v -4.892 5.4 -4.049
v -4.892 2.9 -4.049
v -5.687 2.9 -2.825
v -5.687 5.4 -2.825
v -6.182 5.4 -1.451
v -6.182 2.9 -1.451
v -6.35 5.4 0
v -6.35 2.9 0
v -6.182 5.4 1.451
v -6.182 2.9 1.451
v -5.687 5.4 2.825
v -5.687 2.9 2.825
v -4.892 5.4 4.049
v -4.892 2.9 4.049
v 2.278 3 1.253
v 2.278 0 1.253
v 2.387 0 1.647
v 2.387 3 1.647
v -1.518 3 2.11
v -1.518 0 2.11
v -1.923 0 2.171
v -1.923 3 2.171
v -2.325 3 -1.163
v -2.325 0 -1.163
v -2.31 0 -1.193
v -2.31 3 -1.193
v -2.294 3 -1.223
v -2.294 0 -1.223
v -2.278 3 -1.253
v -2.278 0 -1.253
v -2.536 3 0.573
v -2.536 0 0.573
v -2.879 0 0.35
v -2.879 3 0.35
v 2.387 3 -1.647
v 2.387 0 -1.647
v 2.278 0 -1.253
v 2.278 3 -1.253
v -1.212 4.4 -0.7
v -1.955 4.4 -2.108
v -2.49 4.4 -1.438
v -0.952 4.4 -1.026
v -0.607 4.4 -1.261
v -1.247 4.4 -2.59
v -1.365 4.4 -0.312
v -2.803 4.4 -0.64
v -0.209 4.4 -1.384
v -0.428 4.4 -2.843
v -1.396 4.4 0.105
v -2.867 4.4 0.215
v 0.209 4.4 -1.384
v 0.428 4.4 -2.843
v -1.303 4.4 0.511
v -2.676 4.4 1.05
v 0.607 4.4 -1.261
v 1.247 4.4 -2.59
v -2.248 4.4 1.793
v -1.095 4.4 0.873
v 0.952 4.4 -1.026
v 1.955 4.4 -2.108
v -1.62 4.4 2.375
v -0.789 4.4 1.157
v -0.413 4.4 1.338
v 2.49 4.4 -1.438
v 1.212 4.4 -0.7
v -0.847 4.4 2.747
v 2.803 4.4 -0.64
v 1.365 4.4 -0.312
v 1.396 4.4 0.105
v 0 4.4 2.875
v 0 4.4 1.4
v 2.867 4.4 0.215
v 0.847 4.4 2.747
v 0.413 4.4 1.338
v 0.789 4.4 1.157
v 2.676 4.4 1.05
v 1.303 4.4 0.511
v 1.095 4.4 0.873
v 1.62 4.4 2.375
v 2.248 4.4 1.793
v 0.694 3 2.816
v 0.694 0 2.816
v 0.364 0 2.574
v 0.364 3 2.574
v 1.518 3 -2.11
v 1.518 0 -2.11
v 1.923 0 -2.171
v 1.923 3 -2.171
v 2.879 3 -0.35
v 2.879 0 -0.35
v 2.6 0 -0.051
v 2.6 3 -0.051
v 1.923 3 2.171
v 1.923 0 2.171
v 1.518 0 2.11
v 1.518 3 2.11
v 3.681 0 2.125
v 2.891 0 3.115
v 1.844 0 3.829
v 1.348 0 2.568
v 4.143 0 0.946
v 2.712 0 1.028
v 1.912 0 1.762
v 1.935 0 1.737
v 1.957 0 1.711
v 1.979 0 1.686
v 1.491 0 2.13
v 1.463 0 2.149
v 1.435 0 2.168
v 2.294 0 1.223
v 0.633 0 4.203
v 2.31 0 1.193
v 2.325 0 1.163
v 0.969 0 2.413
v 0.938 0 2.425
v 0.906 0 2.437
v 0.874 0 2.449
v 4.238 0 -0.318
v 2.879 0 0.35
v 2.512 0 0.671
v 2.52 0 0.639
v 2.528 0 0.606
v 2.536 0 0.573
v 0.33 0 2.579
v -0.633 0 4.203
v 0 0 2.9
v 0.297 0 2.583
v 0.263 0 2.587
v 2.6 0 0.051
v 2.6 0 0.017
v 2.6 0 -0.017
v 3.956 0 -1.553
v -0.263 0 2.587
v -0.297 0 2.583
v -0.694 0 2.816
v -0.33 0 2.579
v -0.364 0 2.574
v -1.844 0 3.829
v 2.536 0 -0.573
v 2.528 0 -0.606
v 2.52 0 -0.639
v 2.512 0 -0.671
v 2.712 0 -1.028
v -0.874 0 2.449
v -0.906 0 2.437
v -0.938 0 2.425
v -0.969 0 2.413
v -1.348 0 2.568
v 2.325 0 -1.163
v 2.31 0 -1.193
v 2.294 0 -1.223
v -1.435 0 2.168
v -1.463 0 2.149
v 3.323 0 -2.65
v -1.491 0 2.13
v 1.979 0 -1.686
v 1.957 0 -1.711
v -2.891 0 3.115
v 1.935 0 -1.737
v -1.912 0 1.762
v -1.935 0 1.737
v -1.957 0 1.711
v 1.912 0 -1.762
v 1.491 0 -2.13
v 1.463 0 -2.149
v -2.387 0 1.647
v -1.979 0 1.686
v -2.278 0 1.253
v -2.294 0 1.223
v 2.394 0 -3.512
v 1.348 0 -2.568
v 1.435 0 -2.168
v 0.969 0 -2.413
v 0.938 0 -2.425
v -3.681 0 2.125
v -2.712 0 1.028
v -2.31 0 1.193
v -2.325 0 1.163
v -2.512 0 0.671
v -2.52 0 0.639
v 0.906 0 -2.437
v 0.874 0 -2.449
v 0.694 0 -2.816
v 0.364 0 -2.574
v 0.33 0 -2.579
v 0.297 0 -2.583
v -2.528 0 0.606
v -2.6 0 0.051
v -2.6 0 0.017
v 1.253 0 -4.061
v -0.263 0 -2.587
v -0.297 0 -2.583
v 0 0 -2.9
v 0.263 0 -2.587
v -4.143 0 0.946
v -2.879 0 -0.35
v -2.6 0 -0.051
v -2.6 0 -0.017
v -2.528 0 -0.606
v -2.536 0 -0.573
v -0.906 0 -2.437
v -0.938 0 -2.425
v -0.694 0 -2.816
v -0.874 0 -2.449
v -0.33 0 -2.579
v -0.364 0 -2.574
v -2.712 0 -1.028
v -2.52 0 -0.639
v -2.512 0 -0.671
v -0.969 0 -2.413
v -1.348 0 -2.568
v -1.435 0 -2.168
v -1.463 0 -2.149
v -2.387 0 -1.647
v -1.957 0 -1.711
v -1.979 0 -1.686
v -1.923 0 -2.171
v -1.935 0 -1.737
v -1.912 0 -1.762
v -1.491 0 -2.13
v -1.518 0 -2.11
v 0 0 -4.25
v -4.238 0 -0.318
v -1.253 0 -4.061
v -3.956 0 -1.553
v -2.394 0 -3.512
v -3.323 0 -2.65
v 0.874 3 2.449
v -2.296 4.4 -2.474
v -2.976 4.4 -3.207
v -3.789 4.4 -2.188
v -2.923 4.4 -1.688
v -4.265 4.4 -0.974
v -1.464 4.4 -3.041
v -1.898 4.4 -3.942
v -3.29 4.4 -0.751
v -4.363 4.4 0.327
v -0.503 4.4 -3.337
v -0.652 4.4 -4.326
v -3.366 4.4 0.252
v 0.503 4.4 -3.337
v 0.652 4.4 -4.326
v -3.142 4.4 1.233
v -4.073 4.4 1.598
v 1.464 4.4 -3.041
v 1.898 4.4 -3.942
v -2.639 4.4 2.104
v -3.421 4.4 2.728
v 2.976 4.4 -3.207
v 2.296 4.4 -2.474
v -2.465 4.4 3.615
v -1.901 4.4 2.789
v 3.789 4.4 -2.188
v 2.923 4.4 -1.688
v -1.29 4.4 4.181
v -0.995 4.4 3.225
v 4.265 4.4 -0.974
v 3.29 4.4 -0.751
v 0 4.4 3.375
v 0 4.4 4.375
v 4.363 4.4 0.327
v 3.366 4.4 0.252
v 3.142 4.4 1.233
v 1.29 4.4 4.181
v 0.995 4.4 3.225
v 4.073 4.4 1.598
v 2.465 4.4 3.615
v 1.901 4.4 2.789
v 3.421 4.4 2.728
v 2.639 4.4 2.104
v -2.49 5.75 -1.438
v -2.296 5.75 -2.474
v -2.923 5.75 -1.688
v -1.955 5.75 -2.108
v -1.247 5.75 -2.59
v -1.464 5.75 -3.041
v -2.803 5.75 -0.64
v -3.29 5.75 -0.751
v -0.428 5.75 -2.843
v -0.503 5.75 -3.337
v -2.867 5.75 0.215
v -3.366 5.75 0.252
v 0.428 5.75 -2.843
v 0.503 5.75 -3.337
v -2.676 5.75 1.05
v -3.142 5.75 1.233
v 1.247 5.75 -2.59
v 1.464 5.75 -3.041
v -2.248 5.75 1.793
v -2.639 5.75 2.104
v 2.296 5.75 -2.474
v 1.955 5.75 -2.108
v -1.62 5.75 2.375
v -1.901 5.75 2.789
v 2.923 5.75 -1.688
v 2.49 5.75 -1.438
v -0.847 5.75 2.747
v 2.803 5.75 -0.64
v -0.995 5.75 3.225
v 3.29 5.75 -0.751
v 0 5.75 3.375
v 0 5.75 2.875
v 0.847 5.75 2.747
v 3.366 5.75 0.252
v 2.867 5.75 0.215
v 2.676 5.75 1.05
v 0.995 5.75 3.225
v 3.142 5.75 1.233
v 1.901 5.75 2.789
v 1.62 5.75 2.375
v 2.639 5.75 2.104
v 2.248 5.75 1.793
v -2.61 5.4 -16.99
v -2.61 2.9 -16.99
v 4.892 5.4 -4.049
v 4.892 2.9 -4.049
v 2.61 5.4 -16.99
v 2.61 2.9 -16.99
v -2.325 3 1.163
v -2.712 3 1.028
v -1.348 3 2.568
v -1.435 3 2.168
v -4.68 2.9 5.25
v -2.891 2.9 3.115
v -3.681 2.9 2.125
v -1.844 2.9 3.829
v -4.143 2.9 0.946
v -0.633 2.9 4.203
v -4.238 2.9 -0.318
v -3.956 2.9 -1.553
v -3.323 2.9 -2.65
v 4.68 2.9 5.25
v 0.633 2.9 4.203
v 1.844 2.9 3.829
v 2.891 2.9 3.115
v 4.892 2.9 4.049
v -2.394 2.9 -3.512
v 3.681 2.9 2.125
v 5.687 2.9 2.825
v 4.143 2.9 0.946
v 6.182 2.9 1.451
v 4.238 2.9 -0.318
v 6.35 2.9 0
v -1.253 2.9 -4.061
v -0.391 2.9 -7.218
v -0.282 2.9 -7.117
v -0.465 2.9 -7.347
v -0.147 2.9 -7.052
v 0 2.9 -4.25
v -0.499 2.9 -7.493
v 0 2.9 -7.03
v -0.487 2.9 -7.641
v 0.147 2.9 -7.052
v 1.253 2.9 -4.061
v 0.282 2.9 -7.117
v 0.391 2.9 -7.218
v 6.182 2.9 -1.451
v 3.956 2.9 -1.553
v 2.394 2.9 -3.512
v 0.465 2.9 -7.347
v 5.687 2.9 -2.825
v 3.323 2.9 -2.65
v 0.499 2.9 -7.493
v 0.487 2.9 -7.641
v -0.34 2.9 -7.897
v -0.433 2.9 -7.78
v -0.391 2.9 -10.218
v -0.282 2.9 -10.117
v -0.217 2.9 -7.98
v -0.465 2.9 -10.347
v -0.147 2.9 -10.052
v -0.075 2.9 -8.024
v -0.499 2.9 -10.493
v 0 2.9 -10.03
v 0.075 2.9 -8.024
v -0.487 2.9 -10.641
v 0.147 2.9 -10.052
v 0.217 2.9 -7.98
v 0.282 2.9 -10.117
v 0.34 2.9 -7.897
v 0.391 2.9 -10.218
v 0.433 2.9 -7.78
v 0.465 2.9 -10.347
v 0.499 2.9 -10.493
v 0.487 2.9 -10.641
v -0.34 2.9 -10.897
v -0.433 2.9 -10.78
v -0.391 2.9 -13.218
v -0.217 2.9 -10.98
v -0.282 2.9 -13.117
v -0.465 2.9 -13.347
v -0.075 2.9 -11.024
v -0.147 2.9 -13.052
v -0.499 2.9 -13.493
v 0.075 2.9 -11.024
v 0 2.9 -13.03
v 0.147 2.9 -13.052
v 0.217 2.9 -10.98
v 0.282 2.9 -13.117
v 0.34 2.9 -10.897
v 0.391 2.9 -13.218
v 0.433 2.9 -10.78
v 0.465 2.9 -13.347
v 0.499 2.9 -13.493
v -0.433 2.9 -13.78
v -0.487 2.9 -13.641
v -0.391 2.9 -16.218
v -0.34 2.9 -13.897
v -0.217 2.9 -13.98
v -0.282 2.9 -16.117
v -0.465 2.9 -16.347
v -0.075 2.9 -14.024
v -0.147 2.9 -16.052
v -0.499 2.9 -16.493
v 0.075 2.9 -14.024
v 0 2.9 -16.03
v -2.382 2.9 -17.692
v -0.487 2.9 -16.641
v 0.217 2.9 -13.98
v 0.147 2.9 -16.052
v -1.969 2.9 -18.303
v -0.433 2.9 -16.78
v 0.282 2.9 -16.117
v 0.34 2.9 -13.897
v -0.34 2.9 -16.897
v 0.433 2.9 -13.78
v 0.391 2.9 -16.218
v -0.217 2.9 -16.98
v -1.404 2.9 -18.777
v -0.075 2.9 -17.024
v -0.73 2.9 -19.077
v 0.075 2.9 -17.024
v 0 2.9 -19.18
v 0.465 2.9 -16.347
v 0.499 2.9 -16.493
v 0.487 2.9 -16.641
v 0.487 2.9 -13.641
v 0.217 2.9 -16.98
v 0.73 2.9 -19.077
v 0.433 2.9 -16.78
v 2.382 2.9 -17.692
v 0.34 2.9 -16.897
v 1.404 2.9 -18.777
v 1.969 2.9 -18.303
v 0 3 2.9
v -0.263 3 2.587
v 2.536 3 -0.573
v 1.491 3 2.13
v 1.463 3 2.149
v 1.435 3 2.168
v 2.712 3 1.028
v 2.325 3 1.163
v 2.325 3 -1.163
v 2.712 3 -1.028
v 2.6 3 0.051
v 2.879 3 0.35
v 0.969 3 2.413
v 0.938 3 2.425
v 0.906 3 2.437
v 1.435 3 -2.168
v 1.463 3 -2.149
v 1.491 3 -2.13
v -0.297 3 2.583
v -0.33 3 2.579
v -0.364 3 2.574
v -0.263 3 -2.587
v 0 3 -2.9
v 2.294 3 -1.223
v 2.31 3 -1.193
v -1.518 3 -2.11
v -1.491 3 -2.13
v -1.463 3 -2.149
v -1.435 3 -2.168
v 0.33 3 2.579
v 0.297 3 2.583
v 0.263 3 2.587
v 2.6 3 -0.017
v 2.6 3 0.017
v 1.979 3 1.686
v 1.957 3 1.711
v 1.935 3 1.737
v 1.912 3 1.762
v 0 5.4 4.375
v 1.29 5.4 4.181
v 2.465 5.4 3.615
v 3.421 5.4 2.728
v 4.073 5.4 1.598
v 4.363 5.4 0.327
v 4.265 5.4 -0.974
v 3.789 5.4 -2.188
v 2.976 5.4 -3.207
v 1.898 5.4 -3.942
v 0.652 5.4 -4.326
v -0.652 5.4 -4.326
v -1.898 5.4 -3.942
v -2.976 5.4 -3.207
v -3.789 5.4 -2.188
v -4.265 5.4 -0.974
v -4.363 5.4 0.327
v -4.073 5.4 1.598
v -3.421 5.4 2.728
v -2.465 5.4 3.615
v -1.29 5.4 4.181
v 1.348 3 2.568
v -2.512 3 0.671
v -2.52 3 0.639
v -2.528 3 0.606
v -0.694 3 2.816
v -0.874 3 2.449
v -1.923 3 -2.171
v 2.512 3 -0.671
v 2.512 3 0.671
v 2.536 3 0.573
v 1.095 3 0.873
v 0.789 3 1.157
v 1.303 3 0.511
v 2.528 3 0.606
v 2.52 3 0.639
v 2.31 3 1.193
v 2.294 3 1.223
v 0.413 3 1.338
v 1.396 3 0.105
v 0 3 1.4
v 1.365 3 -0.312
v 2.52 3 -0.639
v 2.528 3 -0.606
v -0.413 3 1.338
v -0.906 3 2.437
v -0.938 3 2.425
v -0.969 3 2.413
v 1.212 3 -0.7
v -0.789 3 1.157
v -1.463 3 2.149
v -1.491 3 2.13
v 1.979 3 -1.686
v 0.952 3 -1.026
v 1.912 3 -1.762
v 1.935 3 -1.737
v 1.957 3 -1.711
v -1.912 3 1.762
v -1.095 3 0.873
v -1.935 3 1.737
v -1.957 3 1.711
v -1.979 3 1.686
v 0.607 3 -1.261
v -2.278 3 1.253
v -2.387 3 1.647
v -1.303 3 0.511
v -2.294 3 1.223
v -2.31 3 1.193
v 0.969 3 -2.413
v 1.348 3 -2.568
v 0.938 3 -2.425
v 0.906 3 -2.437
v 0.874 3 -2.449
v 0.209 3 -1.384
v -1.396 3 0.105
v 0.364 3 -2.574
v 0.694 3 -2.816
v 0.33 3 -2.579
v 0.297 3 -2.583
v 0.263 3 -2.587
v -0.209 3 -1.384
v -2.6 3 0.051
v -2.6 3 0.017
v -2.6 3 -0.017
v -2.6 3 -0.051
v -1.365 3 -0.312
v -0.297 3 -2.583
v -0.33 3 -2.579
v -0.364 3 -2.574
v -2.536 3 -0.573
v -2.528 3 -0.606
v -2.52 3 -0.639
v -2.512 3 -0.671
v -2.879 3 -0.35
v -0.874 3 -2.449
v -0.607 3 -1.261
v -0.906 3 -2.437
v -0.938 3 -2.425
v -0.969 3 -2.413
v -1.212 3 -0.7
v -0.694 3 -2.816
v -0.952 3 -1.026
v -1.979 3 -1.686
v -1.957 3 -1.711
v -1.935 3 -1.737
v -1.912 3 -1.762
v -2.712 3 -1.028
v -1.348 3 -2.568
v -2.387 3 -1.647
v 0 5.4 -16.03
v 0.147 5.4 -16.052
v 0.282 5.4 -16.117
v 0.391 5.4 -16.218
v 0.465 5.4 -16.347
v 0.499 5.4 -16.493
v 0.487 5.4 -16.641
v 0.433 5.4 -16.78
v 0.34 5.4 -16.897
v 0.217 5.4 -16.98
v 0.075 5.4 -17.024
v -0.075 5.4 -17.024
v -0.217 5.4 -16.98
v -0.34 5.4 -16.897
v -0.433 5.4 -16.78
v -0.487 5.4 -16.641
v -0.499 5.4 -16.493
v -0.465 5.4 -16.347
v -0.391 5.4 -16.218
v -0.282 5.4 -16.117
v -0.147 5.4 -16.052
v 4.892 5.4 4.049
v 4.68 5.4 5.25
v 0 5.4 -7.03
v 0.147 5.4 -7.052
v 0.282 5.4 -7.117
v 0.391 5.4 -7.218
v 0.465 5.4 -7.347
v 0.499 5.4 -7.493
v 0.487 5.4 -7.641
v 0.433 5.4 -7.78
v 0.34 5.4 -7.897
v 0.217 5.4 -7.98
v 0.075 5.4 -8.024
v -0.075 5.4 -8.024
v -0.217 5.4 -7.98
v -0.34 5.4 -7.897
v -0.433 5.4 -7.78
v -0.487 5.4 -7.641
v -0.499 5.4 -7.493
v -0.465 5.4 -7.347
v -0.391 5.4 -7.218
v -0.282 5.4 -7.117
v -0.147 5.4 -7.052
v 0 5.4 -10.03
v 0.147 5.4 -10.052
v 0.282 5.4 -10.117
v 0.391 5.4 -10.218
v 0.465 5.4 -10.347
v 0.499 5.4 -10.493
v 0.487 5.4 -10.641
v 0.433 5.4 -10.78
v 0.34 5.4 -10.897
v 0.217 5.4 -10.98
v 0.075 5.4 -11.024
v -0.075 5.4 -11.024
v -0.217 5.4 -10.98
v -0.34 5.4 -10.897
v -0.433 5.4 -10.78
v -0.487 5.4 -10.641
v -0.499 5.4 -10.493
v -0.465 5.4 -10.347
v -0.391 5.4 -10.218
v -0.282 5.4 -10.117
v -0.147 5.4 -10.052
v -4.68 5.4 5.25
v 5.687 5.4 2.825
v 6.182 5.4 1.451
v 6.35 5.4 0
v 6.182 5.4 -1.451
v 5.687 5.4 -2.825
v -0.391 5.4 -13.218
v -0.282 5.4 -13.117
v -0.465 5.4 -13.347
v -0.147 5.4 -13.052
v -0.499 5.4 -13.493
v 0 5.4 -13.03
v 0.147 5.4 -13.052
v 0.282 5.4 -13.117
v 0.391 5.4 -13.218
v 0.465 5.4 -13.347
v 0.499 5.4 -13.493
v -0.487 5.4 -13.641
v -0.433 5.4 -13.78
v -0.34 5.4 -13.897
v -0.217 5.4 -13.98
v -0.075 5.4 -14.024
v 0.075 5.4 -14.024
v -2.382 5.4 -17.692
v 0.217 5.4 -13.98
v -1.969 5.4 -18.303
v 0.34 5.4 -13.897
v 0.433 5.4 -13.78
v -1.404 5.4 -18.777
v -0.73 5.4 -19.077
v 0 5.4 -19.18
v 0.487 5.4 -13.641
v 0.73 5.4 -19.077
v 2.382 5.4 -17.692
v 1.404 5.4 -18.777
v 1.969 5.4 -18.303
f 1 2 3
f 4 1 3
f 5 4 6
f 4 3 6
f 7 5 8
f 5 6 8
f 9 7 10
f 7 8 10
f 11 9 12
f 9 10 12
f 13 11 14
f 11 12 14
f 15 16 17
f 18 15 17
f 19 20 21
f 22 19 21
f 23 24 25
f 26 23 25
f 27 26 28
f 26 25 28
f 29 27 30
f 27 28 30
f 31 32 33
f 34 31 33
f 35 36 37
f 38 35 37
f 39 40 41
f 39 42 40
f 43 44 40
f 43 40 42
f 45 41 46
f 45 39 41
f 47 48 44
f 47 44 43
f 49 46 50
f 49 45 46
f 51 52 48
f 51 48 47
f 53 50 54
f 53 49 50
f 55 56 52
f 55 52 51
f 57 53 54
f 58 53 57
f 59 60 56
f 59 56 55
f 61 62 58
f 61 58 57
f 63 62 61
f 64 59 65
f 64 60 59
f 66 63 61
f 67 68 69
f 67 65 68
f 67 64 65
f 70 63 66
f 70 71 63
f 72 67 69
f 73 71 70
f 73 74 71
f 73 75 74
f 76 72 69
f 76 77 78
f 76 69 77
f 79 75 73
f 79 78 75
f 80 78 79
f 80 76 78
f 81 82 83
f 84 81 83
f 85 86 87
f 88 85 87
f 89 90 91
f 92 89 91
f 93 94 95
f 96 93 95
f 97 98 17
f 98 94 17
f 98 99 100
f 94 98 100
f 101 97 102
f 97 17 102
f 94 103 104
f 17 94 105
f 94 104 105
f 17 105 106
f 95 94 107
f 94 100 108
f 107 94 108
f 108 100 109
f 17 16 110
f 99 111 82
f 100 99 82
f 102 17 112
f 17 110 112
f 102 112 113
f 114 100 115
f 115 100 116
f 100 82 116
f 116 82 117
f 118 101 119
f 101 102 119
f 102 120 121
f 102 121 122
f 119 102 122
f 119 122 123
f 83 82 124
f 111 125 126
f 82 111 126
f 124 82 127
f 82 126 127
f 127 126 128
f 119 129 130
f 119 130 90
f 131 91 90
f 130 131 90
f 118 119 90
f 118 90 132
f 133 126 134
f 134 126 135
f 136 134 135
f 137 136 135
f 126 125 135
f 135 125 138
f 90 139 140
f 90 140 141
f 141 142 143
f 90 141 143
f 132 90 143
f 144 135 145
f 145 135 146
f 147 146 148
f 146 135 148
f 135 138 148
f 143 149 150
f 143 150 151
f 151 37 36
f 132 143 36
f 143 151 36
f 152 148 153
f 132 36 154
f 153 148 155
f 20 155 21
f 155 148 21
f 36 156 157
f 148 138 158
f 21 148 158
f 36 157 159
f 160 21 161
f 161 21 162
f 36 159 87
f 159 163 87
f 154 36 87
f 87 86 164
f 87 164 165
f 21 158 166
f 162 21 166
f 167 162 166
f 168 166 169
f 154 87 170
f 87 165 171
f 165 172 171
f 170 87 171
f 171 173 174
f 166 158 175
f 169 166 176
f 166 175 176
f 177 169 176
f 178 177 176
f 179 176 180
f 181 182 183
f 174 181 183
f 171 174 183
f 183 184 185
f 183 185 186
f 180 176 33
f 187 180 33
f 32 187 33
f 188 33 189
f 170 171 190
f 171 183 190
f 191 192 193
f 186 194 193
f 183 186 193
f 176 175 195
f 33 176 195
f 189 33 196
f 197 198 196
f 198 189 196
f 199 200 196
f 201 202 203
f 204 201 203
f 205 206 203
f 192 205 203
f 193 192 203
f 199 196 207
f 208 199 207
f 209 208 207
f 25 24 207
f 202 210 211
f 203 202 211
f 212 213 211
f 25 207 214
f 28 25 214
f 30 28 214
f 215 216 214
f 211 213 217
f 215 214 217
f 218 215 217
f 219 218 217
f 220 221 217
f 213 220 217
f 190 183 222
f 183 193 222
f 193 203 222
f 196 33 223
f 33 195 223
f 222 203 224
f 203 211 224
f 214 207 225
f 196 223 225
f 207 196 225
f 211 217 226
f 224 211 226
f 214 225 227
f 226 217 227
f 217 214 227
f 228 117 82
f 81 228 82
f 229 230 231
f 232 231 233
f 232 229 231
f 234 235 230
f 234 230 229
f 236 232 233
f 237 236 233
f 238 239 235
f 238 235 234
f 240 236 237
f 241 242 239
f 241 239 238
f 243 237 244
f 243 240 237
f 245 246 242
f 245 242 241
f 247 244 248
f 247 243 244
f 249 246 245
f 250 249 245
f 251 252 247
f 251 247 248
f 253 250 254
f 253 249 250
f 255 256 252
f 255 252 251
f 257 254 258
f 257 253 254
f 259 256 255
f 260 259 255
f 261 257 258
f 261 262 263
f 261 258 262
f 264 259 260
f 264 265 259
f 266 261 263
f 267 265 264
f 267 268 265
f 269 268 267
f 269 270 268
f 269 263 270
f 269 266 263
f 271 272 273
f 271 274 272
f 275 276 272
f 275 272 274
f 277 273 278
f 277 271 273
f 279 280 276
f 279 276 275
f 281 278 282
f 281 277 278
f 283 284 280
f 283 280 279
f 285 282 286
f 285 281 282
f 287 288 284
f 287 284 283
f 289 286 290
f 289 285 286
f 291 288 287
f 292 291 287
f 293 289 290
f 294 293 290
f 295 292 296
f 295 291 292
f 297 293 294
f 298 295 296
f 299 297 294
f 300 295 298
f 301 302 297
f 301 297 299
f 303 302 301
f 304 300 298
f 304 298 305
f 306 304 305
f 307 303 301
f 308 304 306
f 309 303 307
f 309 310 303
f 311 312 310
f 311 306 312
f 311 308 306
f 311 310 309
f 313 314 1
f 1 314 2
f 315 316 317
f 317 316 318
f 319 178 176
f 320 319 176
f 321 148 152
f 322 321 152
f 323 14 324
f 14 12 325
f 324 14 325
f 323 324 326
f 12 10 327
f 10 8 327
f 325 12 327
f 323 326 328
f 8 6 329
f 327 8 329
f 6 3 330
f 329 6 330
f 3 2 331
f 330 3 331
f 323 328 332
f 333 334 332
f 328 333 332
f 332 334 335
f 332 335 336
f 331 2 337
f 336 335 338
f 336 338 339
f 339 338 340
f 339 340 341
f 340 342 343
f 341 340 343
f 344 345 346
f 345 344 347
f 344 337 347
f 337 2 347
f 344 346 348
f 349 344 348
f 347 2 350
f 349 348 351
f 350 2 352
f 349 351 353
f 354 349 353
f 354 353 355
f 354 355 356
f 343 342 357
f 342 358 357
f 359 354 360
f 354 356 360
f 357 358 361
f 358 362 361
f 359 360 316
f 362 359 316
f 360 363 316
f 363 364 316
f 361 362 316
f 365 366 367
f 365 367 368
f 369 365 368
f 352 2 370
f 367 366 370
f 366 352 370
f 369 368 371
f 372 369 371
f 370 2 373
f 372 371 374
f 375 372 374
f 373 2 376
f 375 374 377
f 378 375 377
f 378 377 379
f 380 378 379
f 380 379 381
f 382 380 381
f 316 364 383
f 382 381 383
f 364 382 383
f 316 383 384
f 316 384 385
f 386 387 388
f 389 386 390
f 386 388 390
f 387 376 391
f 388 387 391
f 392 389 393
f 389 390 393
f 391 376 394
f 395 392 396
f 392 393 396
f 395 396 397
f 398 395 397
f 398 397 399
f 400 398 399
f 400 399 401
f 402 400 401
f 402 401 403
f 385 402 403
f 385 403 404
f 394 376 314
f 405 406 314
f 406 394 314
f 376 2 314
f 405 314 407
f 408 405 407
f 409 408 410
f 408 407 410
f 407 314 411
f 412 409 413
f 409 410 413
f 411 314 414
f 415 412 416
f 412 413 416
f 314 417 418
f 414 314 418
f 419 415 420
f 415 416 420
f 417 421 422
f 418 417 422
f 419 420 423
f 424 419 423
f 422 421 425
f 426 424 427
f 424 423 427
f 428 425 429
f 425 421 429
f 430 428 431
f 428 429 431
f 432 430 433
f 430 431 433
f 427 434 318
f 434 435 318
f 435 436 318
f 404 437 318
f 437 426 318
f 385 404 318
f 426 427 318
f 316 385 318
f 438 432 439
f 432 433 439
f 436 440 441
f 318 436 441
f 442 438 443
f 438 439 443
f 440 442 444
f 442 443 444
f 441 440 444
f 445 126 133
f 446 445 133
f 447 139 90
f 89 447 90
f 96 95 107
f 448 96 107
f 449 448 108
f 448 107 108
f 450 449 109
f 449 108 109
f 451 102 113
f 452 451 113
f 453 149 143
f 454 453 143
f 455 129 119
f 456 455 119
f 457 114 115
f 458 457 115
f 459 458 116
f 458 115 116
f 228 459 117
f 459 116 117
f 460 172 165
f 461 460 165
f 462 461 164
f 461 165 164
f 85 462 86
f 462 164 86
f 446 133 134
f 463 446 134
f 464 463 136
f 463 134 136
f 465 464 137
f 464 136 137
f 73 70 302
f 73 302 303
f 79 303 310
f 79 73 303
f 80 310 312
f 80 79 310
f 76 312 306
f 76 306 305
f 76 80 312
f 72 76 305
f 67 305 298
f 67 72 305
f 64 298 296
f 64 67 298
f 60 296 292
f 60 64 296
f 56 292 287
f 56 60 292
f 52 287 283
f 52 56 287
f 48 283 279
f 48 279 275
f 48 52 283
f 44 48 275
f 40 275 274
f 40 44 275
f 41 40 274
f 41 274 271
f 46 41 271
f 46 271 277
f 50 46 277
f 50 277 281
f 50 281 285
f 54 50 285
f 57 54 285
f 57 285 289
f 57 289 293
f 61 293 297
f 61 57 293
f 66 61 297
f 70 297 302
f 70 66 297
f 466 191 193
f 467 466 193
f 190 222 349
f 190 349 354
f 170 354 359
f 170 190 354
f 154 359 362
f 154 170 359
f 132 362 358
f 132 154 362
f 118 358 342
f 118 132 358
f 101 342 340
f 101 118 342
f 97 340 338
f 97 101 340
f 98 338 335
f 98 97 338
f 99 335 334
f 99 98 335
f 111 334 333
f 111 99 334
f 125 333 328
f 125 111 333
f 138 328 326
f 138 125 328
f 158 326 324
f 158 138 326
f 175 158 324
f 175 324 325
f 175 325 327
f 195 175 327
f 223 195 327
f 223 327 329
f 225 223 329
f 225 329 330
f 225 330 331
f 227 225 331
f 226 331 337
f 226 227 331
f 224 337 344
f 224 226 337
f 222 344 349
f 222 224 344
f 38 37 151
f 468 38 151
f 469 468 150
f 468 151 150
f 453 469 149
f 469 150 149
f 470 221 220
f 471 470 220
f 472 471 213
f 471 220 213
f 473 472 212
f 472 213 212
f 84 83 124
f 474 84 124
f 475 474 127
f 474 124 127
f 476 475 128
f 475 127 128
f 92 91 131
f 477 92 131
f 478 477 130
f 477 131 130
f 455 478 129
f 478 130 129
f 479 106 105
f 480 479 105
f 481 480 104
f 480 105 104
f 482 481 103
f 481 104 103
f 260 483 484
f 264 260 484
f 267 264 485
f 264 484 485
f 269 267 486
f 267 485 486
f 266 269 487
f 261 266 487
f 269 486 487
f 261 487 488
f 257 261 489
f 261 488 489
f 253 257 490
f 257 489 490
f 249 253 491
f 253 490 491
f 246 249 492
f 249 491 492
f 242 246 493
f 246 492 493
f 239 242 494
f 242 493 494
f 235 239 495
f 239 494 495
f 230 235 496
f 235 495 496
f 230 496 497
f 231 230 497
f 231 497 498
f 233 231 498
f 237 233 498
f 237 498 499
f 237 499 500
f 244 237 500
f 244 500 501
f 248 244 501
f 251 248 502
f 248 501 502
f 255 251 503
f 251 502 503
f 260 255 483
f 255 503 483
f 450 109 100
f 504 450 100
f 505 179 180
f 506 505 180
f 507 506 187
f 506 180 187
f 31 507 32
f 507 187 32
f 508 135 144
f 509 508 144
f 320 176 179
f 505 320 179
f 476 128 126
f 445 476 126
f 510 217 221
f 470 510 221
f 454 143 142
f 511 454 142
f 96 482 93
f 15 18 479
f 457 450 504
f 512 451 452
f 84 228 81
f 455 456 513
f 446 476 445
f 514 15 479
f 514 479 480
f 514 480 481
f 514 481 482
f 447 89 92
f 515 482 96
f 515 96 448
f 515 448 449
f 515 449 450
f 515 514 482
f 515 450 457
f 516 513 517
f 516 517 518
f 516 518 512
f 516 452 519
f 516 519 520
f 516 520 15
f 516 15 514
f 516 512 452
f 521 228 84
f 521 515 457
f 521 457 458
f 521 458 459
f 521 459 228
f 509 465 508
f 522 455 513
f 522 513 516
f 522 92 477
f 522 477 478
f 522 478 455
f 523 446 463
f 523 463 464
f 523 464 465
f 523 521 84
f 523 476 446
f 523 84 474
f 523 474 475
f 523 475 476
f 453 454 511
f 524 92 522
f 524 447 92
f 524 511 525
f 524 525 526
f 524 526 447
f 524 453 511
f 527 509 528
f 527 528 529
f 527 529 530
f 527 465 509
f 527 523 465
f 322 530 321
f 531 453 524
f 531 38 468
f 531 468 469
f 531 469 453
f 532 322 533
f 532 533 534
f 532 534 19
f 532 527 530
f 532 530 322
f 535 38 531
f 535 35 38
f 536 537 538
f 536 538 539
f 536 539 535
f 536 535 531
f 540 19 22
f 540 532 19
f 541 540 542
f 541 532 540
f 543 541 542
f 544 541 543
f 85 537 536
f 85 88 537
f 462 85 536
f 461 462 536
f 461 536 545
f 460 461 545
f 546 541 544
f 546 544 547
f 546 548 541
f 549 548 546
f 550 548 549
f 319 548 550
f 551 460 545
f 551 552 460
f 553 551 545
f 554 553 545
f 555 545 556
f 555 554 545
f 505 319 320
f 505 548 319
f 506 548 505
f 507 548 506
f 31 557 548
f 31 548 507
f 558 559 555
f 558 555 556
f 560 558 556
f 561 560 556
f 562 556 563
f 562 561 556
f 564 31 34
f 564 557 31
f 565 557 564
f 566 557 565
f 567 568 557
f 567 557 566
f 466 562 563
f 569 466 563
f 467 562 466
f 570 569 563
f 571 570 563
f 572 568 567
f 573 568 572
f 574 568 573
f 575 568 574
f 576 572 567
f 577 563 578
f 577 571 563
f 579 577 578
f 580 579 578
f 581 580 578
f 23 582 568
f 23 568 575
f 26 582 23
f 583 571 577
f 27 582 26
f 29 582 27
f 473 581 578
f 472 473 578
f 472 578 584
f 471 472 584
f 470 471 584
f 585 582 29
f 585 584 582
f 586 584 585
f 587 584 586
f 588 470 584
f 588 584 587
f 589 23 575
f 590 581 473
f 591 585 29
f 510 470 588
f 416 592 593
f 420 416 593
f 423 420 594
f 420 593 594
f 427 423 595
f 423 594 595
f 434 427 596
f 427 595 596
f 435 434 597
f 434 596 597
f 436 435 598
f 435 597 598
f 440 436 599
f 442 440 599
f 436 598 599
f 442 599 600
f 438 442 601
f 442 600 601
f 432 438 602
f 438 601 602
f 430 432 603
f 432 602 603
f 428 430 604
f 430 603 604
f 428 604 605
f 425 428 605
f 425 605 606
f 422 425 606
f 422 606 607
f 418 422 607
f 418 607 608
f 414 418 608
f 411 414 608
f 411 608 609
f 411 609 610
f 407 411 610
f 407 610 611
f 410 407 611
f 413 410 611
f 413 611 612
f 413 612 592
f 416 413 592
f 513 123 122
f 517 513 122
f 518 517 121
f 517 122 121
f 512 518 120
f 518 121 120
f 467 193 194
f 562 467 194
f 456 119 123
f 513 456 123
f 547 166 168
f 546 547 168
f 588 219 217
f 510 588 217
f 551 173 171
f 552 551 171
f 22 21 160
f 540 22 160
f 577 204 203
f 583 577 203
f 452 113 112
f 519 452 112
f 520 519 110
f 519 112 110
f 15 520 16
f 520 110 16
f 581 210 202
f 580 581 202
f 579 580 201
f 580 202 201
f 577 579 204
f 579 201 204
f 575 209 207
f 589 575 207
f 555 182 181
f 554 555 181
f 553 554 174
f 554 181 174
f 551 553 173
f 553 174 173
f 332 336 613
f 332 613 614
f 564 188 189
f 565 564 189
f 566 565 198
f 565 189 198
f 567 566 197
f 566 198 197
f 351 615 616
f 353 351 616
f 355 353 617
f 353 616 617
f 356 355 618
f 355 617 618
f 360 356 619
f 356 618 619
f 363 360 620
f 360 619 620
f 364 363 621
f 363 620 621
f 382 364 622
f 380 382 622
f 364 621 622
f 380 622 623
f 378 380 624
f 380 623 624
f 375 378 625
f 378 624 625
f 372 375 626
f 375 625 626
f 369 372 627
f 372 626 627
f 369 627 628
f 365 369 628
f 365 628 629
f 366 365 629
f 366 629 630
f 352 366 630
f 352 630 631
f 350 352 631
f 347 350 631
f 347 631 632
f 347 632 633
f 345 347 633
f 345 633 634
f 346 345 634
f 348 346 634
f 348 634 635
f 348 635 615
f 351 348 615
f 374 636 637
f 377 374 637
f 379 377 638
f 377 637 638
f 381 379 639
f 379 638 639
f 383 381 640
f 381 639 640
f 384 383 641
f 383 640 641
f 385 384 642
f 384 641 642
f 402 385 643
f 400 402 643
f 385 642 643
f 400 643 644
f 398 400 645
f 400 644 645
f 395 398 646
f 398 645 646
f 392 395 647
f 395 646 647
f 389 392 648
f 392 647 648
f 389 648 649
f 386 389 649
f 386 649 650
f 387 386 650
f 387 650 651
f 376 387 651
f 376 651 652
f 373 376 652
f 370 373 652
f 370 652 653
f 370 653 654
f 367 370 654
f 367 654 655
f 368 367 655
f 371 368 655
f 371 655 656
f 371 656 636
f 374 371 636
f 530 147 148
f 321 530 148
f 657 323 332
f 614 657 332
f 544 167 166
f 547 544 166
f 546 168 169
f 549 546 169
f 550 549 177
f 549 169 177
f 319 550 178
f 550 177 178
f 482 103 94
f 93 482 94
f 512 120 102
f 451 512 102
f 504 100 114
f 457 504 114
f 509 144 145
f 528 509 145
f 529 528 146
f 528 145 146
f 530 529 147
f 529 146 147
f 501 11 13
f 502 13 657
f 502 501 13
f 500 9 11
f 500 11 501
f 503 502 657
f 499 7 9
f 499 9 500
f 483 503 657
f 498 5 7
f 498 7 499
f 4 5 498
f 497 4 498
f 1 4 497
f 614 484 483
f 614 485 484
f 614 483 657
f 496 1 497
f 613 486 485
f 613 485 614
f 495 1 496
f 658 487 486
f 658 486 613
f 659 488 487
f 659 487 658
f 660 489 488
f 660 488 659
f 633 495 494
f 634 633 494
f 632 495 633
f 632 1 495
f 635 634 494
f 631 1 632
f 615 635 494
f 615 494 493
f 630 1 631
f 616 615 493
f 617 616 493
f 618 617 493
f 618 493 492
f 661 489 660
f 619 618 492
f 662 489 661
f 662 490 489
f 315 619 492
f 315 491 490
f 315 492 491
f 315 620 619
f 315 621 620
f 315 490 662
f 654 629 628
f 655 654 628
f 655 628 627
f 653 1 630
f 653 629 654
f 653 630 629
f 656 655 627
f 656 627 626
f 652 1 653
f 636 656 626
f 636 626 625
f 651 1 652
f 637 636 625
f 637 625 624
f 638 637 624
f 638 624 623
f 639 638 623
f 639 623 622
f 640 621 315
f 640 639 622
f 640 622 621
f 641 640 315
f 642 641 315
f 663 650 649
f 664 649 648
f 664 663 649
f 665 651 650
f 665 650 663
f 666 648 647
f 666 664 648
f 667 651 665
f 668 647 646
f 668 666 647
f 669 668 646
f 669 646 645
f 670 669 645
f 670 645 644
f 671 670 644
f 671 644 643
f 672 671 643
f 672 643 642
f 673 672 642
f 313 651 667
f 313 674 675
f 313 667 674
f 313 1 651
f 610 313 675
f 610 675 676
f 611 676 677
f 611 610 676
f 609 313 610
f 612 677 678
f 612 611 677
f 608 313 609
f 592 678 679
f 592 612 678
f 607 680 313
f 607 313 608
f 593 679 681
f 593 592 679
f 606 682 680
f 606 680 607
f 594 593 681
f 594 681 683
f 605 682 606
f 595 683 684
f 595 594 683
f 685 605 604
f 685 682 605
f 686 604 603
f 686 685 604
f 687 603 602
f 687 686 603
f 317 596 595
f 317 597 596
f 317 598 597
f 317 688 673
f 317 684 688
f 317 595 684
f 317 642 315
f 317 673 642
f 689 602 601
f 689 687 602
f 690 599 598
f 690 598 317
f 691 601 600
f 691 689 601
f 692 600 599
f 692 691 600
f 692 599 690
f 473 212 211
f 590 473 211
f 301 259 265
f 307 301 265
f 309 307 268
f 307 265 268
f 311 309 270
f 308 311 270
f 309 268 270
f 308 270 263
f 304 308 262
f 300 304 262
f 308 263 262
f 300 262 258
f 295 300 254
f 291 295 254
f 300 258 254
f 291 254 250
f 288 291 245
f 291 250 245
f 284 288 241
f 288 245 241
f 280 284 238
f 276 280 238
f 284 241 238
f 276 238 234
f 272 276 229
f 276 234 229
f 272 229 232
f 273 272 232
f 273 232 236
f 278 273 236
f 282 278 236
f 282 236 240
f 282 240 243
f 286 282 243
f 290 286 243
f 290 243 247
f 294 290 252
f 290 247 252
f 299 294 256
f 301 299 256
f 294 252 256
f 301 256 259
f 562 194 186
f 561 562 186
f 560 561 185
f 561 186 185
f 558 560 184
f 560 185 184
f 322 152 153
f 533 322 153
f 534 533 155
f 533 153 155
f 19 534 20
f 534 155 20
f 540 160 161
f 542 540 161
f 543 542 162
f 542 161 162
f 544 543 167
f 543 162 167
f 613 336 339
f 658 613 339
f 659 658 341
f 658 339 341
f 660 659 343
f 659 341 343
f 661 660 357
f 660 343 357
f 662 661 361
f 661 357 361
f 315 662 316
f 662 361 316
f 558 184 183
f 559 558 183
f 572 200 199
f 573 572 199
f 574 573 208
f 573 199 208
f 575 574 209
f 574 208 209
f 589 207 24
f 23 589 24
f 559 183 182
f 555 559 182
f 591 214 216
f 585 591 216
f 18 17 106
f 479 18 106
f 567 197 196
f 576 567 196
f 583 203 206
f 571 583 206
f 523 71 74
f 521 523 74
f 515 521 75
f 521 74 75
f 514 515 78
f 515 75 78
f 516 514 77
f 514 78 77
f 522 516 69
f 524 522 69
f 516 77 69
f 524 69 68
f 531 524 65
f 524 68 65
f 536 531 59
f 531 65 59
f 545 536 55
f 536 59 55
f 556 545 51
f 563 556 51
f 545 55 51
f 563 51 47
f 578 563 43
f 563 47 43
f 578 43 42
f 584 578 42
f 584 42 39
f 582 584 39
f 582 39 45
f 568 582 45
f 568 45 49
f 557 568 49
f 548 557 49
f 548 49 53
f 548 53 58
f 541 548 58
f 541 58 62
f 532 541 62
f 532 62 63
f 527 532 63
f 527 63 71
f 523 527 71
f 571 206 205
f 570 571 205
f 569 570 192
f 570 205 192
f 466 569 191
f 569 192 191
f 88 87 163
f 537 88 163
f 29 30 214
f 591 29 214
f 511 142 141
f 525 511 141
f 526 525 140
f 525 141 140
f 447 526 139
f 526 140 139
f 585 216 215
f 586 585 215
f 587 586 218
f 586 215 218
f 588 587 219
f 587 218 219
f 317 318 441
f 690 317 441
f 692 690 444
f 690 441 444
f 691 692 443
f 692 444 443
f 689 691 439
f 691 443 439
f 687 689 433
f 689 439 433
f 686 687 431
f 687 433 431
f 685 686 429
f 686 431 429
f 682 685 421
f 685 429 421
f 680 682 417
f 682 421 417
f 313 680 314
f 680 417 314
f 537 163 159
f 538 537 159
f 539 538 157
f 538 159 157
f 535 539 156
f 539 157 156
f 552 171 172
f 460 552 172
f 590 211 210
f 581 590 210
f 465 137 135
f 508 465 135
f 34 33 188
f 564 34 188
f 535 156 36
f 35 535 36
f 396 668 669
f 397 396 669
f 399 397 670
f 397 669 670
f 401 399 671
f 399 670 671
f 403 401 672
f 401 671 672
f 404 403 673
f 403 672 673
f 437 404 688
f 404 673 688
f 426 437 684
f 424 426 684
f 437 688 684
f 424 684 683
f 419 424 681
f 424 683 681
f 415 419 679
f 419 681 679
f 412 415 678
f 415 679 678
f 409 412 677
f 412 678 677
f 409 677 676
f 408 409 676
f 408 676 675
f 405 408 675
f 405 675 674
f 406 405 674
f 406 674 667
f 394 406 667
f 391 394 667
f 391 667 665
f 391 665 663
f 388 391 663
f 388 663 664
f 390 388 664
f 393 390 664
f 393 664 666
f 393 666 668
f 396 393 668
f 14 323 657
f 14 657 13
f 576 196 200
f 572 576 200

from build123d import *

# Parameters (mm, degrees)
BASES_R                     = 6.35
BASE_DEPTH                  = 5.4
TOPBORES_R                  = 1.4
TOP_BORE_DEPTH              = 11.478788098
HORN_START                  = -2.5
HORN_HALF_DEPTH             = 2.5
HORNATTACHS_R               = 0.5
HORN_ATTACH_DEPTH           = 21.913031822
HA_LP_COUNT                 = 4
HA_LP_PITCH                 = 3
HORN_BODIES_COPY_1_SKETCH_R = 0.5
HORN_BODIES_COPY_1_DEPTH    = 21.913031822
HORN_BODIES_COPY_2_SKETCH_R = 0.5
HORN_BODIES_COPY_2_DEPTH    = 21.913031822
HORN_BODIES_COPY_3_SKETCH_R = 0.5
HORN_BODIES_COPY_3_DEPTH    = 21.913031822
TOOTH_DEPTH                 = 3
TOOTH_CP_COUNT              = 26
BOTTOMBORES_R               = 2.6
BOTTOM_BORE_DEPTH           = 3
HOLDINGSHAFTS_R             = 6.35
HOLDINGSHAFTS_R_2           = 4.25
HOLDING_SHAFT_DEPTH         = 2.9
TOPCUTS_R                   = 4.375
TOP_CUT_DEPTH               = 1
TOPPOCKETCYLINDERS_R        = 3.375
TOPPOCKETCYLINDERS_R_2      = 2.875
TOP_POCKET_CYLINDER_DEPTH   = 1.35
CUT_EXTRUDE1_START          = -2.5
CUT_EXTRUDE1_DEPTH          = 2.5


with BuildPart() as part:
    # BaseS → BASE (new body)
    with BuildSketch(Plane(origin=(0, 0, 0), x_dir=(1, 0, 0), z_dir=(0, 1, 0))):
        with Locations(Location((0, 0, 0), (0, 0, 90))):
            Circle(BASES_R)
    extrude(amount=BASE_DEPTH)

    # TopBoreS → TOP BORE (cut, through all)
    with BuildSketch(Plane(origin=(0, 5.4, 0), x_dir=(1, 0, 0), z_dir=(0, 1, 0))):
        with Locations(Location((0, 0, 0), (0, 0, 270))):
            Circle(TOPBORES_R)
    extrude(amount=-TOP_BORE_DEPTH, mode=Mode.SUBTRACT)

    # HornHalfS → HORN HALF (add)
    with BuildSketch(Plane(origin=(0, 5.4, 0), x_dir=(1, 0, 0), z_dir=(0, 1, 0)).offset(HORN_START)):
        with BuildLine():
            Line((-2.609740545, 16.990167671), (-4.891612682, 4.049027706))
            ThreePointArc((-4.891612682, 4.049027706), (0, 6.35), (4.891612682, 4.049027706))
            Line((4.891612682, 4.049027706), (2.609740545, 16.990167671))
            ThreePointArc((2.609740545, 16.990167671), (0, 19.18), (-2.609740545, 16.990167671))
        make_face()
    horn_half = extrude(amount=HORN_HALF_DEPTH)

    # HornAttachS → HORN ATTACH (cut, through all)
    with BuildSketch(Plane(origin=(0, 5.4, 0), x_dir=(1, 0, 0), z_dir=(0, 1, 0))):
        with Locations(Location((0, 16.53, 0), (0, 0, 270))):
            Circle(HORNATTACHS_R)
    horn_attach = extrude(amount=-HORN_ATTACH_DEPTH, mode=Mode.SUBTRACT)

    # HA LP: HORN ATTACH ×4
    with Locations(*[(0, 0, i * HA_LP_PITCH) for i in range(1, HA_LP_COUNT)]):
        add(horn_attach, mode=Mode.SUBTRACT)

    # HORN BODIES: HORN HALF, HORN ATTACH across plane
    add(horn_half.mirror(Plane.XY))
    add(horn_attach.mirror(Plane.XY), mode=Mode.SUBTRACT)

    # HORN BODIES copy 1 sketch → HORN BODIES copy 1 (cut, through all)
    with BuildSketch(Plane(origin=(0, 5.4, -3), x_dir=(1, 0, 0), z_dir=(0, 1, 0))):
        with Locations((0, -16.53)):
            Circle(HORN_BODIES_COPY_1_SKETCH_R)
    extrude(amount=-HORN_BODIES_COPY_1_DEPTH, mode=Mode.SUBTRACT)

    # HORN BODIES copy 2 sketch → HORN BODIES copy 2 (cut, through all)
    with BuildSketch(Plane(origin=(0, 5.4, -6), x_dir=(1, 0, 0), z_dir=(0, 1, 0))):
        with Locations((0, -16.53)):
            Circle(HORN_BODIES_COPY_2_SKETCH_R)
    extrude(amount=-HORN_BODIES_COPY_2_DEPTH, mode=Mode.SUBTRACT)

    # HORN BODIES copy 3 sketch → HORN BODIES copy 3 (cut, through all)
    with BuildSketch(Plane(origin=(0, 5.4, -9), x_dir=(1, 0, 0), z_dir=(0, 1, 0))):
        with Locations((0, -16.53)):
            Circle(HORN_BODIES_COPY_3_SKETCH_R)
    extrude(amount=-HORN_BODIES_COPY_3_DEPTH, mode=Mode.SUBTRACT)

    # ToothS → TOOTH (cut)
    with BuildSketch(Plane.XZ):
        with BuildLine():
            Line((0, -2.9), (0.262912611, -2.586672952))
            ThreePointArc((0.262912611, -2.586672952), (0, -2.6), (-0.262912611, -2.586672952))
            Line((-0.262912611, -2.586672952), (0, -2.9))
        make_face()
    tooth = extrude(amount=-TOOTH_DEPTH, mode=Mode.SUBTRACT)

    # TOOTH CP: TOOTH ×26 about axis
    tooth_cp_axis = Axis((0, 0, 0), (0, 1, 0))
    for i in range(1, TOOTH_CP_COUNT):
        add(tooth.rotate(tooth_cp_axis, i * 360 / TOOTH_CP_COUNT), mode=Mode.SUBTRACT)

    # BottomBoreS → BOTTOM BORE (cut)
    with BuildSketch(Plane(origin=(0, 0, 0), x_dir=(-1, 0, 0), z_dir=(0, -1, 0))):
        Circle(BOTTOMBORES_R)
    extrude(amount=-BOTTOM_BORE_DEPTH, mode=Mode.SUBTRACT)

    # HoldingShaftS → HOLDING SHAFT (cut)
    with BuildSketch(Plane.XZ):
        Circle(HOLDINGSHAFTS_R)
        with Locations(Location((0, 0, 0), (0, 0, 270))):
            Circle(HOLDINGSHAFTS_R_2, mode=Mode.SUBTRACT)
    extrude(amount=-HOLDING_SHAFT_DEPTH, mode=Mode.SUBTRACT)

    # TopCutS → TOP CUT (cut)
    with BuildSketch(Plane(origin=(0, 5.4, 0), x_dir=(1, 0, 0), z_dir=(0, 1, 0))):
        with Locations(Location((0, 0, 0), (0, 0, 270))):
            Circle(TOPCUTS_R)
    extrude(amount=-TOP_CUT_DEPTH, mode=Mode.SUBTRACT)

    # TopPocketCylinderS → TOP POCKET CYLINDER (add)
    with BuildSketch(Plane(origin=(0, 4.4, 0), x_dir=(1, 0, 0), z_dir=(0, 1, 0))):
        with Locations(Location((0, 0, 0), (0, 0, 270))):
            Circle(TOPPOCKETCYLINDERS_R)
        with Locations(Location((0, 0, 0), (0, 0, 270))):
            Circle(TOPPOCKETCYLINDERS_R_2, mode=Mode.SUBTRACT)
    extrude(amount=TOP_POCKET_CYLINDER_DEPTH)

    # Sketch1 → Cut-Extrude1 (cut)
    with BuildSketch(Plane(origin=(0, 5.4, 0), x_dir=(1, 0, 0), z_dir=(0, 1, 0)).offset(CUT_EXTRUDE1_START)):
        with BuildLine():
            Line((4.679848864, -5.25), (2.609740545, -16.990167671))
            ThreePointArc((2.609740545, -16.990167671), (0, -19.18), (-2.609740545, -16.990167671))
            Line((-2.609740545, -16.990167671), (-4.679848864, -5.25))
            Line((-4.679848864, -5.25), (4.679848864, -5.25))
        make_face()
    extrude(amount=CUT_EXTRUDE1_DEPTH, mode=Mode.SUBTRACT)


solid = part.part
